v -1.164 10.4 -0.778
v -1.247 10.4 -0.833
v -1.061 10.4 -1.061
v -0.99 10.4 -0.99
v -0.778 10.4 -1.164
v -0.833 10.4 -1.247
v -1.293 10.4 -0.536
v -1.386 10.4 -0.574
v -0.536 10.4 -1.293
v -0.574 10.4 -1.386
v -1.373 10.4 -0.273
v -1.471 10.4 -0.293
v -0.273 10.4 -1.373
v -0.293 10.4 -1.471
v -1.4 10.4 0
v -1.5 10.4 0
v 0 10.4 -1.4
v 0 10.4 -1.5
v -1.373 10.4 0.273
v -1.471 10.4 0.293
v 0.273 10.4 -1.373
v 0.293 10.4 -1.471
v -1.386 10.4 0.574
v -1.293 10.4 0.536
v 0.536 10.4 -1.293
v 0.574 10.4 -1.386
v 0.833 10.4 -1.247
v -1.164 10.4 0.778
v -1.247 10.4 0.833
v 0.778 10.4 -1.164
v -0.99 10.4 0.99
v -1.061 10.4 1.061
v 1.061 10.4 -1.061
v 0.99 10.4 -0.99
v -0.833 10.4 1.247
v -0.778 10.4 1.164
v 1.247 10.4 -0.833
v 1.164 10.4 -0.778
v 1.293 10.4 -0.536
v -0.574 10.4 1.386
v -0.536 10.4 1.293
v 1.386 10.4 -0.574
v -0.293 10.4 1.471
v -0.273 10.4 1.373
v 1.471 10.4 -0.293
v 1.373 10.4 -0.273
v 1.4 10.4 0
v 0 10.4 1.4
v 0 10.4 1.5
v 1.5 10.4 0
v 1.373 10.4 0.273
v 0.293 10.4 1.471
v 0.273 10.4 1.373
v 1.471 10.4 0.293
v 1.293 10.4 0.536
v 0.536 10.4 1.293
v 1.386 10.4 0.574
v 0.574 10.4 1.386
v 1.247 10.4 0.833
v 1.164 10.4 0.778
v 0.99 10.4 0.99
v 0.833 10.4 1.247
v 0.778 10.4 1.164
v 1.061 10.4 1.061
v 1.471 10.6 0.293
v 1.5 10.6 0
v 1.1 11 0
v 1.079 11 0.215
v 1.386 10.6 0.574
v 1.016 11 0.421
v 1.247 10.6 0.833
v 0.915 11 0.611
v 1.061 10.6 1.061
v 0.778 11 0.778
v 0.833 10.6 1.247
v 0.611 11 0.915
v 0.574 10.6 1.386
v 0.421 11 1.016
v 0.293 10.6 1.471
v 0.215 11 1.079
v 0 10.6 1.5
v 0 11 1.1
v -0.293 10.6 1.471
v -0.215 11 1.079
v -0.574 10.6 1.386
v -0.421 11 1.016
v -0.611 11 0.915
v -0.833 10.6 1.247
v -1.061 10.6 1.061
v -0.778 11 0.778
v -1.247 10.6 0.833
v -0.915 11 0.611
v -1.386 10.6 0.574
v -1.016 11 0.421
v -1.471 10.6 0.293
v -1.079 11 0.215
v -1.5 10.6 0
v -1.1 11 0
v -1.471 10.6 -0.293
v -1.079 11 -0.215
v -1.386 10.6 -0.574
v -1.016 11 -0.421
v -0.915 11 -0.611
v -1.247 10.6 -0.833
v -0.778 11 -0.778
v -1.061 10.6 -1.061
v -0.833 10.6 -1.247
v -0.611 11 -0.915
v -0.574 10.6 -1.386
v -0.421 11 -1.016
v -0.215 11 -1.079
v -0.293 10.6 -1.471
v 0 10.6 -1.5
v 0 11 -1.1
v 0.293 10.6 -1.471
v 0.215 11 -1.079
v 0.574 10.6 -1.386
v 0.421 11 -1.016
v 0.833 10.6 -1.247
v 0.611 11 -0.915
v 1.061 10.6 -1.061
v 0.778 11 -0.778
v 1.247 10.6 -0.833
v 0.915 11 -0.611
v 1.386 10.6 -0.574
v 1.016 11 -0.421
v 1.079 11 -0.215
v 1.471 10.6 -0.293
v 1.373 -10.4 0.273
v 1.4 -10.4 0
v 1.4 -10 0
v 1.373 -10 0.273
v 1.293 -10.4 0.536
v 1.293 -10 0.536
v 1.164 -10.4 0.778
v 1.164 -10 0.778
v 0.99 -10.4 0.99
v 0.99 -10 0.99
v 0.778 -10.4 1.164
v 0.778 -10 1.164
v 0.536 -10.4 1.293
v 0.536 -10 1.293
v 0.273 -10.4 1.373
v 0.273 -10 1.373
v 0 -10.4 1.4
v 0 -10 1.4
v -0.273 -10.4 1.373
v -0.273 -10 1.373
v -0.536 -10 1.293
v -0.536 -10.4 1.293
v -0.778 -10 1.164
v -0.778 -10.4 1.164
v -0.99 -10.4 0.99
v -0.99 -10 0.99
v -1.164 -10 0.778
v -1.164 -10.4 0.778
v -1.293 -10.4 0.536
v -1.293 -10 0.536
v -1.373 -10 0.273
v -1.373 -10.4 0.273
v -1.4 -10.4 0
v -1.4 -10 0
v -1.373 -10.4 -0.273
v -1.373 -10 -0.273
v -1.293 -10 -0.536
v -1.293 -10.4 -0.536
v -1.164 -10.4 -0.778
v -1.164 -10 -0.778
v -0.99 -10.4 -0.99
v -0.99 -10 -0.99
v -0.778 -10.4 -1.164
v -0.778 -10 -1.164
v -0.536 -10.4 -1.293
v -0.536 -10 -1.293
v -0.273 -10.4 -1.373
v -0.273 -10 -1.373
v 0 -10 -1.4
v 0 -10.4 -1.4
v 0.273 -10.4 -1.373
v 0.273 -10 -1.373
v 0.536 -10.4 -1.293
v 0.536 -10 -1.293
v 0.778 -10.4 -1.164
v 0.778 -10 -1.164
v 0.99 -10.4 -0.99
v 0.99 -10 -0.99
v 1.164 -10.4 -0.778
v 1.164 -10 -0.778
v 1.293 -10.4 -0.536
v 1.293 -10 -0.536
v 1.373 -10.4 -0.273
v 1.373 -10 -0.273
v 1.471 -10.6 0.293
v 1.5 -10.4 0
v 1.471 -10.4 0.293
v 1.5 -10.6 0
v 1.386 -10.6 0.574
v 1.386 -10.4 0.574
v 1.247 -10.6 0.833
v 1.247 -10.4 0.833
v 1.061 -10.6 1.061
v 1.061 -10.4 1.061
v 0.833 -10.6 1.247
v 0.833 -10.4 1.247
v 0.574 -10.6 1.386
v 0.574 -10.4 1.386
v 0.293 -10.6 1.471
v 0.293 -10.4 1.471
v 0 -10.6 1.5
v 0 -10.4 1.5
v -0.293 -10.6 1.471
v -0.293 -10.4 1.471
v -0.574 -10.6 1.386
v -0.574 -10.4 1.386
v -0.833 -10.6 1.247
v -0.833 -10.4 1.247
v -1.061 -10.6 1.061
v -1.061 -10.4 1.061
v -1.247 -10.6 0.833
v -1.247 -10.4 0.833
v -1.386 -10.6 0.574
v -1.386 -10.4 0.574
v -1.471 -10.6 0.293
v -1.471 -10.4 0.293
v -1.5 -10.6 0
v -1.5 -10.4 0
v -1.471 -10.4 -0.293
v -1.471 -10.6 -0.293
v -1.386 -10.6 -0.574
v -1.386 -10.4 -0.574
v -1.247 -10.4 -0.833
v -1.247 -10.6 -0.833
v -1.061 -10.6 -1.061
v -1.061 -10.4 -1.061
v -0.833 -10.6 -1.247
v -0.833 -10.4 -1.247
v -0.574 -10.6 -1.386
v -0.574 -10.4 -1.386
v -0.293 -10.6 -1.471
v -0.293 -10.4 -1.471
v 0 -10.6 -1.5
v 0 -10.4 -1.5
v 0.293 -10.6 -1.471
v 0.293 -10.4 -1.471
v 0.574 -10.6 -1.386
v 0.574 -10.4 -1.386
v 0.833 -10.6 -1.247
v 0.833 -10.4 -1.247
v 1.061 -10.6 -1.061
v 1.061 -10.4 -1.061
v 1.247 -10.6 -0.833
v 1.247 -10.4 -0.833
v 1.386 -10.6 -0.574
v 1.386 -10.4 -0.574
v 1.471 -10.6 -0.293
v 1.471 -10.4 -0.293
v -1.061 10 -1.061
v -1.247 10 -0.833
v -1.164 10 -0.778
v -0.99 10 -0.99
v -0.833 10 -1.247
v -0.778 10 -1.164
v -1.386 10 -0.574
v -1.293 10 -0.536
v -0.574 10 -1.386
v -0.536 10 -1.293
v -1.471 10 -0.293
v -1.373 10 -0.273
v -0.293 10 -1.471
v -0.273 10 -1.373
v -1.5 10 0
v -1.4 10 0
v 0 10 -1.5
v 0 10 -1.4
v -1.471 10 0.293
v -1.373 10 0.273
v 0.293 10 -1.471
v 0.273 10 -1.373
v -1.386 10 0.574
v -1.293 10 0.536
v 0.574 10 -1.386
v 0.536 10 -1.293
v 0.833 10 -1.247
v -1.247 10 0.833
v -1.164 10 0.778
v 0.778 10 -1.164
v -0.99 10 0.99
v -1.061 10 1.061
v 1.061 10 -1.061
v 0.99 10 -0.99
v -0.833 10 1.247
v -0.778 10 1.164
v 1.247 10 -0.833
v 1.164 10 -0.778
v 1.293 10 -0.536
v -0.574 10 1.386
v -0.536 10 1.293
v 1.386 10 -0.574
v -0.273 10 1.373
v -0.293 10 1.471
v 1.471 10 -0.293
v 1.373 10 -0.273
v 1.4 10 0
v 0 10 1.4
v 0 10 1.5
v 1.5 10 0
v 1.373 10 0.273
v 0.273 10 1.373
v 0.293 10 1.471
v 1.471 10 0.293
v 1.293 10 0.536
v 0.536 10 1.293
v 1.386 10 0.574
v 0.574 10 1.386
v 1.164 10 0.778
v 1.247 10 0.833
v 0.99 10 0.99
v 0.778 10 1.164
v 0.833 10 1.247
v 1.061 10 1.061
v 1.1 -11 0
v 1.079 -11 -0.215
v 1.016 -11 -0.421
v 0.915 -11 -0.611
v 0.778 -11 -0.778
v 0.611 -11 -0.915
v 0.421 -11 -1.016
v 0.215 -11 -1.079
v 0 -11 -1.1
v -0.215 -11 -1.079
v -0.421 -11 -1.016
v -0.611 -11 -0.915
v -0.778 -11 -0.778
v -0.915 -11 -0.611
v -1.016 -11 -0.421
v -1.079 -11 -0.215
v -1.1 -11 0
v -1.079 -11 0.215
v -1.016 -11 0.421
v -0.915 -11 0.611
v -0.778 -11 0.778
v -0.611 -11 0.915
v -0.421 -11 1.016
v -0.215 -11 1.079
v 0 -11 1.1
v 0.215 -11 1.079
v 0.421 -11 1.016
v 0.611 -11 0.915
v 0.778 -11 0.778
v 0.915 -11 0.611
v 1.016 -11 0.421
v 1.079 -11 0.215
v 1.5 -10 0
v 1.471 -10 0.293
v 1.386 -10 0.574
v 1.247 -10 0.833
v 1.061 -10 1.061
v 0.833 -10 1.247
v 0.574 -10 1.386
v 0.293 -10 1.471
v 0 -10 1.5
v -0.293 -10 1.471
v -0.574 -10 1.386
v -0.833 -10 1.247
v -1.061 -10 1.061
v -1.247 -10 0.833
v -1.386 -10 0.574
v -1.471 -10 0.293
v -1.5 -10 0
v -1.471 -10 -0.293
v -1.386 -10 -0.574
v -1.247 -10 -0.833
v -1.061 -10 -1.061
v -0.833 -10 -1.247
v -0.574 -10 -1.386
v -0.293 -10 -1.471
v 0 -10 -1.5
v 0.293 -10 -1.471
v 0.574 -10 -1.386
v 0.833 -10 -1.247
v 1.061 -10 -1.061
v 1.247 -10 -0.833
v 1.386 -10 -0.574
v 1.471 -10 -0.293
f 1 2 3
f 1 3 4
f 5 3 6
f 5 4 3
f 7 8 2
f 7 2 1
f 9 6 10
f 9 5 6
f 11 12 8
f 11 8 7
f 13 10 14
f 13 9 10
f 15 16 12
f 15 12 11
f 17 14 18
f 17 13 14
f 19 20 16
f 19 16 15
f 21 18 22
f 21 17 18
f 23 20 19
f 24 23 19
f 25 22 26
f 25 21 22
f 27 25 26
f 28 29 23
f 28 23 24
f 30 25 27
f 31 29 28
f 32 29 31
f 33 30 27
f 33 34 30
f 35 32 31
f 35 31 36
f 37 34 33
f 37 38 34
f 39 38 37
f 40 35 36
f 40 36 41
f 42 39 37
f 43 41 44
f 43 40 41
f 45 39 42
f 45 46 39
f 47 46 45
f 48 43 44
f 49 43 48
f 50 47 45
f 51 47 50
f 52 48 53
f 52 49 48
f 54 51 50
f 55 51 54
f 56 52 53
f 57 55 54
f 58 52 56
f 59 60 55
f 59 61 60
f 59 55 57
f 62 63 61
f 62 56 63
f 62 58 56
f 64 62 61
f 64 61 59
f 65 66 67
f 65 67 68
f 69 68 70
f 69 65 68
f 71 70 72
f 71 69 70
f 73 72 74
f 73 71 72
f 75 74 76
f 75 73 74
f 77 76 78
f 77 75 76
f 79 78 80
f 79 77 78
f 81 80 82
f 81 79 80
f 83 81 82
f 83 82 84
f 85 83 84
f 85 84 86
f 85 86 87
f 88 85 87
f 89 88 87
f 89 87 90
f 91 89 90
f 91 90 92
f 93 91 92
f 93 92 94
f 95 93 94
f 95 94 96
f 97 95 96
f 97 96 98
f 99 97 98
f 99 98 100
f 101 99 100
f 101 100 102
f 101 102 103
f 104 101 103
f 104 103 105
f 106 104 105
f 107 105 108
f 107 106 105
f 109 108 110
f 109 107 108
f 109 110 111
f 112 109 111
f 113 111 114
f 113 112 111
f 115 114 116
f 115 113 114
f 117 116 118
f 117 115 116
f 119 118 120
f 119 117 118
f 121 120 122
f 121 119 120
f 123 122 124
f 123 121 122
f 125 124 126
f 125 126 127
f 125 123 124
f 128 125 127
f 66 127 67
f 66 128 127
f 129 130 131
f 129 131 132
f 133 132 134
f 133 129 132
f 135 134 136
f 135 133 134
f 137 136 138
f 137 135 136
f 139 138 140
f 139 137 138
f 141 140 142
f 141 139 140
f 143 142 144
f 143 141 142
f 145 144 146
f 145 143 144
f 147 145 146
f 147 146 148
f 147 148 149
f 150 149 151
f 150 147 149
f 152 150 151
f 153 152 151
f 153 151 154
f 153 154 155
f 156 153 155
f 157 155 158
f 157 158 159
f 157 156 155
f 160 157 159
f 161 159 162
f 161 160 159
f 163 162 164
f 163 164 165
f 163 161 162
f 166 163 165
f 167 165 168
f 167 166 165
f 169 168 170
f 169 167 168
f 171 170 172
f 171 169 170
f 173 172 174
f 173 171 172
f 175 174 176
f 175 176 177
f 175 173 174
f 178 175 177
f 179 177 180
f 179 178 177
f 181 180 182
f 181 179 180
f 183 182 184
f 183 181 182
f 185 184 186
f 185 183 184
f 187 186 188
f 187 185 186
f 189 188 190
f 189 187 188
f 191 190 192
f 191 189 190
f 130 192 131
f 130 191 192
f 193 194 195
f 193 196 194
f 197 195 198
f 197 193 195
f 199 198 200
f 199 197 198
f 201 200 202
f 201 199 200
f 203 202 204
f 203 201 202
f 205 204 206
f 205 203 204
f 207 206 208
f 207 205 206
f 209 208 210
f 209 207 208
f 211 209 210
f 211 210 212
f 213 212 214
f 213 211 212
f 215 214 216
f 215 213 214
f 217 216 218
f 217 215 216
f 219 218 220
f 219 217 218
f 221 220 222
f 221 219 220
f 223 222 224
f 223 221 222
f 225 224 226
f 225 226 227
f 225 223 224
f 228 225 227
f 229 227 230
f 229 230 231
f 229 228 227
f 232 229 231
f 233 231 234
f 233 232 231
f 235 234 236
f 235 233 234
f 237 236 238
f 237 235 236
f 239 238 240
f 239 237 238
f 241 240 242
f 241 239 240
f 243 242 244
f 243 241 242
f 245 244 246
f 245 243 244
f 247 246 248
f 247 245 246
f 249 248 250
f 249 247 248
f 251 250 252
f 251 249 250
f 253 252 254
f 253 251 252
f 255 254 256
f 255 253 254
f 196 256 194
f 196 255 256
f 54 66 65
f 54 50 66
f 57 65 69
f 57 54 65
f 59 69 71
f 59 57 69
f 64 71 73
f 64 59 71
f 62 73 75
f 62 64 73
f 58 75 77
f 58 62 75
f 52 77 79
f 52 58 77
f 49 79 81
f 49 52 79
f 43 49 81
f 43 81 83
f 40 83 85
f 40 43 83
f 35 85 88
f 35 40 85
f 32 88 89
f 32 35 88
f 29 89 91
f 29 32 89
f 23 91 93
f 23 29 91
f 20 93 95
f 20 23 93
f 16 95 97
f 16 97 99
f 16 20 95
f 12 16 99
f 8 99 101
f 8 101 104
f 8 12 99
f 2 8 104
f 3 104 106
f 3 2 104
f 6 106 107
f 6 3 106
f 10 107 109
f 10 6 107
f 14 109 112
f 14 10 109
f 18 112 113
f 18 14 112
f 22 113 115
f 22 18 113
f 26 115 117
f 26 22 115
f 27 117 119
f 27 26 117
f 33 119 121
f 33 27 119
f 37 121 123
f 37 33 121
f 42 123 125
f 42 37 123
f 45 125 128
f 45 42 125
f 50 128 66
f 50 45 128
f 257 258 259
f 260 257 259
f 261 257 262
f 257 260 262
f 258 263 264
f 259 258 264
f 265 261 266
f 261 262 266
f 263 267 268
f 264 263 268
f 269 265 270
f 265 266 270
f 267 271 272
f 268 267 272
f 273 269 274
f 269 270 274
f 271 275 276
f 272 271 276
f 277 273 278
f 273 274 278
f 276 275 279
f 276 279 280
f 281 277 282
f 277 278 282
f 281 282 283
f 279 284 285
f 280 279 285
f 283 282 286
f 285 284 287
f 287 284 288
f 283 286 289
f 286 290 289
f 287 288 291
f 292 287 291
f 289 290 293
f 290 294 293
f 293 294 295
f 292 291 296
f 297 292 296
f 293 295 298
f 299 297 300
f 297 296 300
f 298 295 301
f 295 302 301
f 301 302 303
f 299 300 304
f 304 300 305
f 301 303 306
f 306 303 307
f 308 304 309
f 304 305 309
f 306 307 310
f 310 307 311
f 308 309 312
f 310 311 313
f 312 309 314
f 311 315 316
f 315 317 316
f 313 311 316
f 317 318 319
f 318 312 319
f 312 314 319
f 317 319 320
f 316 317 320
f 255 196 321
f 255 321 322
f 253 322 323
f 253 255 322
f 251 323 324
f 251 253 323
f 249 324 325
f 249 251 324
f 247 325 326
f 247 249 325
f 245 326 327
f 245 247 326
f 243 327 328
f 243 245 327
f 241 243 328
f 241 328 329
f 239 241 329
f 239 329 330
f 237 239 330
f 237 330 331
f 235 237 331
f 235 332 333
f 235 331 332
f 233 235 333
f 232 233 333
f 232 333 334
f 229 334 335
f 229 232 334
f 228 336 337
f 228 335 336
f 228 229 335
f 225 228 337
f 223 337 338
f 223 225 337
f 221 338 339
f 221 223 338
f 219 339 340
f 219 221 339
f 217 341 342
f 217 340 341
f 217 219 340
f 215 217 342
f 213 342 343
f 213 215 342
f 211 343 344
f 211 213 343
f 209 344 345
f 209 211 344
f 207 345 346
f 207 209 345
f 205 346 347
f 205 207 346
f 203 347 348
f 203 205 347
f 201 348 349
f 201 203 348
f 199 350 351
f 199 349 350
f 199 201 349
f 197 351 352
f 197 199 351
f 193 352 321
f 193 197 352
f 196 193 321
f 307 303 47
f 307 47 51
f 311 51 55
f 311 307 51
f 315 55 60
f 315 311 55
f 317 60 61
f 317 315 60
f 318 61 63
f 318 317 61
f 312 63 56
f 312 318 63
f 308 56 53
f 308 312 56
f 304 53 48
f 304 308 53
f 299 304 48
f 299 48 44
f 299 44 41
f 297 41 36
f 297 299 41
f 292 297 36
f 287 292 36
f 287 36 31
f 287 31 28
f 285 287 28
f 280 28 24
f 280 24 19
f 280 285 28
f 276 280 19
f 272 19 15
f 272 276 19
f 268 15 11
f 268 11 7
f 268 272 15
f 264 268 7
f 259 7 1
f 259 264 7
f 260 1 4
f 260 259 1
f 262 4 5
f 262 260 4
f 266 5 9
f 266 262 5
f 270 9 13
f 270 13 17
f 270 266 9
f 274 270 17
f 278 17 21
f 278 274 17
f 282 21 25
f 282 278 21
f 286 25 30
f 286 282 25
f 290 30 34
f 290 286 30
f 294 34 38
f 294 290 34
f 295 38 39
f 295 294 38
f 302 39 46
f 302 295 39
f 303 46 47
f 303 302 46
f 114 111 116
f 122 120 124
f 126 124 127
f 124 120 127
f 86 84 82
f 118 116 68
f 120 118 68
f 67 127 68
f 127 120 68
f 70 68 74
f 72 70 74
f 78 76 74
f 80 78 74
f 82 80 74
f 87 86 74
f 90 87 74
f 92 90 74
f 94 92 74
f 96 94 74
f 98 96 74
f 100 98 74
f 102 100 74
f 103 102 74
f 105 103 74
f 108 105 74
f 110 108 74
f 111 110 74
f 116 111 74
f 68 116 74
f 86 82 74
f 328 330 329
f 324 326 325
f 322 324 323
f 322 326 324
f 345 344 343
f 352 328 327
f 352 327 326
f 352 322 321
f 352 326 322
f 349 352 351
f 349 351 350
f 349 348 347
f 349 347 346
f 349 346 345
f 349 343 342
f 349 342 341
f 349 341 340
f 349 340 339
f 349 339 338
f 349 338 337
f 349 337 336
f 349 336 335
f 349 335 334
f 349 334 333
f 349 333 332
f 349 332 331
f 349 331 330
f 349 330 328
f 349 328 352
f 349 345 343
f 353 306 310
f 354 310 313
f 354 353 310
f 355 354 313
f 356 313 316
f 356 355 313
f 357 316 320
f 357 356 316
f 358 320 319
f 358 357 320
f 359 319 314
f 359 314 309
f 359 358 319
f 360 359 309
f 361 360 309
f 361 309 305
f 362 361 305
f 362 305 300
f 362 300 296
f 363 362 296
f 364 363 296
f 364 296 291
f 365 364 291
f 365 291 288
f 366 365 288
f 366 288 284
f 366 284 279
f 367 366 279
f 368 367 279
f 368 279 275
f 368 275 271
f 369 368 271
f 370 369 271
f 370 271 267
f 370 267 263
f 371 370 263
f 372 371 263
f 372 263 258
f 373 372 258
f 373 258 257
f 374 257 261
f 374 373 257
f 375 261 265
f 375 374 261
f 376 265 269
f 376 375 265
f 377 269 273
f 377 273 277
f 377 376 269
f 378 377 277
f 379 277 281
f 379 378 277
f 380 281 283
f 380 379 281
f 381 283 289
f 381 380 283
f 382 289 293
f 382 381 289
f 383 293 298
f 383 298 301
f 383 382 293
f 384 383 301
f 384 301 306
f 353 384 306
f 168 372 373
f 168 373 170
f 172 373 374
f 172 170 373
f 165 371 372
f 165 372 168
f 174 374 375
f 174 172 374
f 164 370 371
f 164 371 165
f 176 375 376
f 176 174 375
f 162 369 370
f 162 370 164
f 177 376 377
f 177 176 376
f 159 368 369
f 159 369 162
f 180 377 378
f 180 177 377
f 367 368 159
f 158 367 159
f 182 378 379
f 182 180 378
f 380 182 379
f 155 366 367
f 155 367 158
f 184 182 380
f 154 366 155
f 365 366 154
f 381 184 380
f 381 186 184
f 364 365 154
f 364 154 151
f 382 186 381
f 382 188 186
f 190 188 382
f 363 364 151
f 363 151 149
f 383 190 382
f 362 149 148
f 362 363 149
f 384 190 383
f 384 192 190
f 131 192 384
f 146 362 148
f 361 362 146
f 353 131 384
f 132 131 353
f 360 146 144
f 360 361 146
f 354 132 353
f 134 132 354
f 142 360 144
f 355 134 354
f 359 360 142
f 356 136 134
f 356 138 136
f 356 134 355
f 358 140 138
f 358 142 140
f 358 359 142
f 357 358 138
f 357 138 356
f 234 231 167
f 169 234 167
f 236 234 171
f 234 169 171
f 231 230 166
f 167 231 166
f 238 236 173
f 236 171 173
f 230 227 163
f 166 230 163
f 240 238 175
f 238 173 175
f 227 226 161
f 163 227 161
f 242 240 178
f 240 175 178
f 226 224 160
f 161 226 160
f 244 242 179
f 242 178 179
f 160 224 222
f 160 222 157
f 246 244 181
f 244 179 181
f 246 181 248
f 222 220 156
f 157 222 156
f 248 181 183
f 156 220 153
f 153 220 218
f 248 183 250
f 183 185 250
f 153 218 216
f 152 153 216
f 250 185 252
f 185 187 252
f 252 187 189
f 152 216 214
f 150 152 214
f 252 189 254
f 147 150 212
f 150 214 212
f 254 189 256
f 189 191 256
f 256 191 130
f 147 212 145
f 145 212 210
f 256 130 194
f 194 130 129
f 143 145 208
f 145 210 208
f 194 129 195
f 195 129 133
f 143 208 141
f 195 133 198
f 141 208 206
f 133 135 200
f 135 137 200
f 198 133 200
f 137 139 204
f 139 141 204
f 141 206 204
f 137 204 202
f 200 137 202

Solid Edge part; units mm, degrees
sketch "Sketch1" plane through (0, 0, 0) normal (0, 0, 1) x (1, 0, 0)
  line L0 (0, 11) -> (1.5, 11)
  line L1 (1.5, 11) -> (1.5, 10.4)
  line L2 (1.5, 10.4) -> (1.4, 10.4)
  line L3 (1.4, 10.4) -> (1.4, 10)
  line L4 (1.4, 10) -> (1.5, 10)
  line L5 (1.5, 10) -> (1.5, -10)
  line L6 (1.5, -10) -> (1.4, -10)
  line L7 (1.4, -10) -> (1.4, -10.4)
  line L8 (1.4, -10.4) -> (1.5, -10.4)
  line L9 (1.5, -10.4) -> (1.5, -11)
  line L10 (1.5, -11) -> (0, -11)
  line L11 (0, -11) -> (0, 11)
  dimension "D1" = 1.5
  dimension "D2" = 20
  dimension "D3" = 0.4
  dimension "D4" = 1.5
  dimension "D5" = 1.4
  dimension "D6" = 11
  dimension "D7" = 1.4
revolve "RevolvedProtrusion1" add sketch "Sketch1" angle 360 about axis through (0, 54, 0) along (0, -1, 0)
chamfer "Chanfrein_1" distance 0.4 angle 45 2 edges at (1.5, -11, 0) (1.5, 11, 0)
properties material "Acier S235"
